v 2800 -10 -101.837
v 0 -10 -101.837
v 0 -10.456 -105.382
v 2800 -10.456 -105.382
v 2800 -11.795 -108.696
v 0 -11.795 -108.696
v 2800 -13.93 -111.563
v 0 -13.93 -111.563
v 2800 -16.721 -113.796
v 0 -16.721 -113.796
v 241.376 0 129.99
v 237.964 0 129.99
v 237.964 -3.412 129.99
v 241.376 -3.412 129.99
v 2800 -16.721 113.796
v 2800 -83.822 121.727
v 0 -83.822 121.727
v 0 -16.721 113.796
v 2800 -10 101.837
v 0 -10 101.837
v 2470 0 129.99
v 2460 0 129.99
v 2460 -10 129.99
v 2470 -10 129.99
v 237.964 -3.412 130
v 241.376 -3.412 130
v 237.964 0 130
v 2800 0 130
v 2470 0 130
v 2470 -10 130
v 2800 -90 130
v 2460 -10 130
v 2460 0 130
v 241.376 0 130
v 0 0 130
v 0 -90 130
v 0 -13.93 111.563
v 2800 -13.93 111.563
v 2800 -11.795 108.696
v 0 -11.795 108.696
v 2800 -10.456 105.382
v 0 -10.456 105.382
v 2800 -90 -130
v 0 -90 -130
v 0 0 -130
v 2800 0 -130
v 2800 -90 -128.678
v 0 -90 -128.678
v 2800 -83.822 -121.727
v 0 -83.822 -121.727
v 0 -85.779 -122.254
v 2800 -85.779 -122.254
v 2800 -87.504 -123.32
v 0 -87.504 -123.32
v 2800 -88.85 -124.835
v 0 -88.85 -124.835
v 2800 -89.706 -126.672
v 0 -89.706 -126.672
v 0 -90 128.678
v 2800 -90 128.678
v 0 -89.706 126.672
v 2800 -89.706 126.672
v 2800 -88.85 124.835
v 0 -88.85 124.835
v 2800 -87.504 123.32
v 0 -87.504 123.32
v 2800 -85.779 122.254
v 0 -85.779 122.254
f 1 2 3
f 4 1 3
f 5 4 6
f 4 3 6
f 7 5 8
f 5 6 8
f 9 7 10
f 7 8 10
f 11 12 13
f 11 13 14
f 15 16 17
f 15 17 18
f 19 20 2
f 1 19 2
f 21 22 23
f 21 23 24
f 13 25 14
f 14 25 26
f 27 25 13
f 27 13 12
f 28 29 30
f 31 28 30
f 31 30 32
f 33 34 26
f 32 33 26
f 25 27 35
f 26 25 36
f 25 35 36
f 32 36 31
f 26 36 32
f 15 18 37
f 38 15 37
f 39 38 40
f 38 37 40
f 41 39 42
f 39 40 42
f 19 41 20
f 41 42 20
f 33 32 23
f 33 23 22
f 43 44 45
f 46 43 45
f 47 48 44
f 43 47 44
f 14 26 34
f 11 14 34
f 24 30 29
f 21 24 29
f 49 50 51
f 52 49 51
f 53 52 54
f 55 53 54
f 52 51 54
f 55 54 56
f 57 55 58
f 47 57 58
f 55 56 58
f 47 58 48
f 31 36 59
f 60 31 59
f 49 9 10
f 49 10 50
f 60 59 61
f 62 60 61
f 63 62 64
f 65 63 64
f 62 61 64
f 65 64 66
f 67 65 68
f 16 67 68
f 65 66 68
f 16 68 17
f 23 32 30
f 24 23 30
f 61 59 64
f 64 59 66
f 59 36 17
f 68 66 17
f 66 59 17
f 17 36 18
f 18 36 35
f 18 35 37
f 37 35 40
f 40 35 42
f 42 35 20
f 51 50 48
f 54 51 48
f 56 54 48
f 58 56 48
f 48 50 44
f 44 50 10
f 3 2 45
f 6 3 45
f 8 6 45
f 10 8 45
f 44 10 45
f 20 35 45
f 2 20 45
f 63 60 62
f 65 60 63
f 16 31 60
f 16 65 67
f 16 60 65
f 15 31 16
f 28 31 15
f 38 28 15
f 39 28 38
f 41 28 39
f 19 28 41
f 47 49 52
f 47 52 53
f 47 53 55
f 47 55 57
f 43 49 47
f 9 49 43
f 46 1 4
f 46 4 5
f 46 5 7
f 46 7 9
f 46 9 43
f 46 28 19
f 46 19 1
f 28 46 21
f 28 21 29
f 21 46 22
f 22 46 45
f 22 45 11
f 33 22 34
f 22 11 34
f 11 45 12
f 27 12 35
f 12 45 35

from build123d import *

# Parameters (mm, degrees)
EXTRUDE_1_DEPTH     = 2800
SKETCH_3_W          = 3.411754403
SKETCH_3_H          = 3.411754404
CUT_EXTRUDE_1_DEPTH = 0.01
SKETCH_4_W          = 10
SKETCH_4_H          = 10
EXTRUDE_2_DEPTH     = 0.01
SKETCH_4_2_W        = 10
SKETCH_4_2_H        = 10
CUT_EXTRUDE_2_DEPTH = 0.01


with BuildPart() as part:
    # Эскиз2 → Бобышка-Вытянуть1 (new body)
    with BuildSketch(Plane(origin=(0, 0, 0), x_dir=(0, 0, -1), z_dir=(1, 0, 0))):
        with BuildLine():
            Line((130, 0), (-130, 0))
            Line((-130, 0), (-130, -90))
            Line((-130, -90), (-128.678333405, -90))
            ThreePointArc((-128.678333405, -90), (-124.028136062, -88.232175902), (-121.726718983, -83.821618477))
            Line((-121.726718983, -83.821618477), (-113.795983048, -16.720622289))
            ThreePointArc((-113.795983048, -16.720622289), (-108.696165424, -11.795261413), (-101.83727659, -10))
            Line((-101.83727659, -10), (101.83727659, -10))
            ThreePointArc((101.83727659, -10), (108.696165424, -11.795261413), (113.795983048, -16.720622289))
            Line((113.795983048, -16.720622289), (121.726718983, -83.821618477))
            ThreePointArc((121.726718983, -83.821618477), (124.028136062, -88.232175902), (128.678333405, -90))
            Line((128.678333405, -90), (130, -90))
            Line((130, -90), (130, 0))
        make_face()
    extrude(amount=EXTRUDE_1_DEPTH)

    # Эскиз3 → Вырез-Вытянуть1 (cut)
    with BuildSketch(Plane.XY.offset(130)):
        with Locations((239.670222602, -1.705877202)):
            Rectangle(SKETCH_3_W, SKETCH_3_H)
    extrude(amount=-CUT_EXTRUDE_1_DEPTH, mode=Mode.SUBTRACT)

    # Эскиз4 → Бобышка-Вытянуть2 (add)
    with BuildSketch(Plane.XY.offset(130)):
        with Locations((2465, -5)):
            Rectangle(SKETCH_4_W, SKETCH_4_H)
    extrude(amount=-EXTRUDE_2_DEPTH)

    # Эскиз4<2> → Вырез-Вытянуть2 (cut)
    with BuildSketch(Plane.XY.offset(130)):
        with Locations((2465, -5)):
            Rectangle(SKETCH_4_2_W, SKETCH_4_2_H)
    extrude(amount=-CUT_EXTRUDE_2_DEPTH, mode=Mode.SUBTRACT)


solid = part.part
